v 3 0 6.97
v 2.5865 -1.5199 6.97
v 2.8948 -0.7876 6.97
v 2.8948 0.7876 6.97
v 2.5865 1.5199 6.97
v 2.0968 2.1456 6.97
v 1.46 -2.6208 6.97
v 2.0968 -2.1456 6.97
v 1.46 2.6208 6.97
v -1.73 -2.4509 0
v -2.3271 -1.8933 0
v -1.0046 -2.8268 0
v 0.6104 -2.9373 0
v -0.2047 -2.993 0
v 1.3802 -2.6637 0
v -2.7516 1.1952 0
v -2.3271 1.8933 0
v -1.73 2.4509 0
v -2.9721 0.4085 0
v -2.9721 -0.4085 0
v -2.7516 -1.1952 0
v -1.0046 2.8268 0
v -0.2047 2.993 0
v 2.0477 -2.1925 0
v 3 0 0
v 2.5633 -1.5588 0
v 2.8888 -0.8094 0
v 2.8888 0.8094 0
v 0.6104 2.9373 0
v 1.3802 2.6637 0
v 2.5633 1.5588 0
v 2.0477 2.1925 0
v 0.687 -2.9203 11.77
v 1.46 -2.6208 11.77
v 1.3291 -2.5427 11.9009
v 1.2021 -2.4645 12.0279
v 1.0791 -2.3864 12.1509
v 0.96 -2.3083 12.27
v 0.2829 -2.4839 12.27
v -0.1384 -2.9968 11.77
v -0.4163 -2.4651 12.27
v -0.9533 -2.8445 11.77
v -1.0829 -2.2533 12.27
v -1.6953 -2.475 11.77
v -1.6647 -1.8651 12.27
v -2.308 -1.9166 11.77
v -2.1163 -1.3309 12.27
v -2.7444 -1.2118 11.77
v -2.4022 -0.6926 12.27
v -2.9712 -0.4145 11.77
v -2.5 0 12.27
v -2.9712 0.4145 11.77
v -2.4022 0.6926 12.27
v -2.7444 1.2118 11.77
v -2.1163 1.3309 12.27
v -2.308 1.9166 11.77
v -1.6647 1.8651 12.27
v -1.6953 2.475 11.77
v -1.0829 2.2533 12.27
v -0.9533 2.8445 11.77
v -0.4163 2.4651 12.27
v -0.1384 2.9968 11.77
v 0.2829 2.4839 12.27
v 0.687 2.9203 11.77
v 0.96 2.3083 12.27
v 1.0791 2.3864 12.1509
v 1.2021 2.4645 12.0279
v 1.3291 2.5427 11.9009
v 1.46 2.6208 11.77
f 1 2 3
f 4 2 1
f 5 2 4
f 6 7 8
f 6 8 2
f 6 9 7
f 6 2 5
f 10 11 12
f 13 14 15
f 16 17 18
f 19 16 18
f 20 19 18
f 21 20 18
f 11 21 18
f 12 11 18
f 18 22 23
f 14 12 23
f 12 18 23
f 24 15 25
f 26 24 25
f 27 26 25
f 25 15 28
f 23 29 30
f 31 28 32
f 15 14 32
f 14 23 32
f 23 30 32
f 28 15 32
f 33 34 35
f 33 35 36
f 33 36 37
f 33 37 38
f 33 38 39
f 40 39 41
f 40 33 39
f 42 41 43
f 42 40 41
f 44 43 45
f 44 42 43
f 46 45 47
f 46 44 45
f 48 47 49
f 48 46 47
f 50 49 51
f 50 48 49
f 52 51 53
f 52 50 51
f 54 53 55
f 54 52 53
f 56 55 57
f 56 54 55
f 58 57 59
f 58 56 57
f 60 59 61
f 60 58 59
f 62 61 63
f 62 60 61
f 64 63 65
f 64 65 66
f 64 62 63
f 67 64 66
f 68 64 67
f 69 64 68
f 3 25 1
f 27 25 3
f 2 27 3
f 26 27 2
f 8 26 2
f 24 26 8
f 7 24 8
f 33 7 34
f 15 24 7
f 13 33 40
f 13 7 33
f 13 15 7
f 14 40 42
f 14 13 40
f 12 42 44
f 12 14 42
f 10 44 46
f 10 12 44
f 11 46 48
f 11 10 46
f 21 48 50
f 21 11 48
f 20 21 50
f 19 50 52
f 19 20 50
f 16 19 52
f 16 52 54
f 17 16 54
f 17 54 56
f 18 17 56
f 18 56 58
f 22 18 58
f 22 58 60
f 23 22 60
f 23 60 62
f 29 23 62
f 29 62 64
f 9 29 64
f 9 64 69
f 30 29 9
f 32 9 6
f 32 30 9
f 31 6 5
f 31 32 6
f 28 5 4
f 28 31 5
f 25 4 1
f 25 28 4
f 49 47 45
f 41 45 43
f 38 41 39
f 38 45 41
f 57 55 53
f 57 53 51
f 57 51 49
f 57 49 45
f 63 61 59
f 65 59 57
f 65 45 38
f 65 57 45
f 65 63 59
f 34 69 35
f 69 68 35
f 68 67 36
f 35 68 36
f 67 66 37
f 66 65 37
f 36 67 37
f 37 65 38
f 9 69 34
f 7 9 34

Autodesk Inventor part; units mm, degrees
ref_plane "YZ Plane" through (0, 0, 0) normal (1, 0, 0) x (0, 1, 0)
ref_plane "XZ Plane" through (0, 0, 0) normal (0, 1, 0) x (-1, 0, 0)
ref_plane "XY Plane" through (0, 0, 0) normal (0, 0, 1) x (1, 0, 0)
sketch "Sketch1" plane through (0, 0, 0) normal (0, 0, 1) x (1, 0, 0)
  circle A0 centre (0, 0) radius 3
  dimension "d0" = 6
extrude "Extrusion1" add sketch "Sketch1" along normal blind 12.27
sketch "Sketch2" plane through (0, 0, 12.27) normal (0, 0, 1) x (1, 0, 0)
  line L0 (1.46, 2.6208) -> (1.46, -2.6208)
  circle A0 centre (0, 0) radius 3 projected
  point P0 (-3, 0)
  dimension "d3" = 4.46
extrude "Extrusion2" cut sketch "Sketch2" against normal blind 5.3 contours A0 L0 picked at (2.441, 0.367)
chamfer "Chamfer1" distance 0.5 angle 45 2 edges at (-3, 0, 12.27) (1.46, 0, 12.27)
properties part number "PEC12R-4017F-N0024 Shaft"
